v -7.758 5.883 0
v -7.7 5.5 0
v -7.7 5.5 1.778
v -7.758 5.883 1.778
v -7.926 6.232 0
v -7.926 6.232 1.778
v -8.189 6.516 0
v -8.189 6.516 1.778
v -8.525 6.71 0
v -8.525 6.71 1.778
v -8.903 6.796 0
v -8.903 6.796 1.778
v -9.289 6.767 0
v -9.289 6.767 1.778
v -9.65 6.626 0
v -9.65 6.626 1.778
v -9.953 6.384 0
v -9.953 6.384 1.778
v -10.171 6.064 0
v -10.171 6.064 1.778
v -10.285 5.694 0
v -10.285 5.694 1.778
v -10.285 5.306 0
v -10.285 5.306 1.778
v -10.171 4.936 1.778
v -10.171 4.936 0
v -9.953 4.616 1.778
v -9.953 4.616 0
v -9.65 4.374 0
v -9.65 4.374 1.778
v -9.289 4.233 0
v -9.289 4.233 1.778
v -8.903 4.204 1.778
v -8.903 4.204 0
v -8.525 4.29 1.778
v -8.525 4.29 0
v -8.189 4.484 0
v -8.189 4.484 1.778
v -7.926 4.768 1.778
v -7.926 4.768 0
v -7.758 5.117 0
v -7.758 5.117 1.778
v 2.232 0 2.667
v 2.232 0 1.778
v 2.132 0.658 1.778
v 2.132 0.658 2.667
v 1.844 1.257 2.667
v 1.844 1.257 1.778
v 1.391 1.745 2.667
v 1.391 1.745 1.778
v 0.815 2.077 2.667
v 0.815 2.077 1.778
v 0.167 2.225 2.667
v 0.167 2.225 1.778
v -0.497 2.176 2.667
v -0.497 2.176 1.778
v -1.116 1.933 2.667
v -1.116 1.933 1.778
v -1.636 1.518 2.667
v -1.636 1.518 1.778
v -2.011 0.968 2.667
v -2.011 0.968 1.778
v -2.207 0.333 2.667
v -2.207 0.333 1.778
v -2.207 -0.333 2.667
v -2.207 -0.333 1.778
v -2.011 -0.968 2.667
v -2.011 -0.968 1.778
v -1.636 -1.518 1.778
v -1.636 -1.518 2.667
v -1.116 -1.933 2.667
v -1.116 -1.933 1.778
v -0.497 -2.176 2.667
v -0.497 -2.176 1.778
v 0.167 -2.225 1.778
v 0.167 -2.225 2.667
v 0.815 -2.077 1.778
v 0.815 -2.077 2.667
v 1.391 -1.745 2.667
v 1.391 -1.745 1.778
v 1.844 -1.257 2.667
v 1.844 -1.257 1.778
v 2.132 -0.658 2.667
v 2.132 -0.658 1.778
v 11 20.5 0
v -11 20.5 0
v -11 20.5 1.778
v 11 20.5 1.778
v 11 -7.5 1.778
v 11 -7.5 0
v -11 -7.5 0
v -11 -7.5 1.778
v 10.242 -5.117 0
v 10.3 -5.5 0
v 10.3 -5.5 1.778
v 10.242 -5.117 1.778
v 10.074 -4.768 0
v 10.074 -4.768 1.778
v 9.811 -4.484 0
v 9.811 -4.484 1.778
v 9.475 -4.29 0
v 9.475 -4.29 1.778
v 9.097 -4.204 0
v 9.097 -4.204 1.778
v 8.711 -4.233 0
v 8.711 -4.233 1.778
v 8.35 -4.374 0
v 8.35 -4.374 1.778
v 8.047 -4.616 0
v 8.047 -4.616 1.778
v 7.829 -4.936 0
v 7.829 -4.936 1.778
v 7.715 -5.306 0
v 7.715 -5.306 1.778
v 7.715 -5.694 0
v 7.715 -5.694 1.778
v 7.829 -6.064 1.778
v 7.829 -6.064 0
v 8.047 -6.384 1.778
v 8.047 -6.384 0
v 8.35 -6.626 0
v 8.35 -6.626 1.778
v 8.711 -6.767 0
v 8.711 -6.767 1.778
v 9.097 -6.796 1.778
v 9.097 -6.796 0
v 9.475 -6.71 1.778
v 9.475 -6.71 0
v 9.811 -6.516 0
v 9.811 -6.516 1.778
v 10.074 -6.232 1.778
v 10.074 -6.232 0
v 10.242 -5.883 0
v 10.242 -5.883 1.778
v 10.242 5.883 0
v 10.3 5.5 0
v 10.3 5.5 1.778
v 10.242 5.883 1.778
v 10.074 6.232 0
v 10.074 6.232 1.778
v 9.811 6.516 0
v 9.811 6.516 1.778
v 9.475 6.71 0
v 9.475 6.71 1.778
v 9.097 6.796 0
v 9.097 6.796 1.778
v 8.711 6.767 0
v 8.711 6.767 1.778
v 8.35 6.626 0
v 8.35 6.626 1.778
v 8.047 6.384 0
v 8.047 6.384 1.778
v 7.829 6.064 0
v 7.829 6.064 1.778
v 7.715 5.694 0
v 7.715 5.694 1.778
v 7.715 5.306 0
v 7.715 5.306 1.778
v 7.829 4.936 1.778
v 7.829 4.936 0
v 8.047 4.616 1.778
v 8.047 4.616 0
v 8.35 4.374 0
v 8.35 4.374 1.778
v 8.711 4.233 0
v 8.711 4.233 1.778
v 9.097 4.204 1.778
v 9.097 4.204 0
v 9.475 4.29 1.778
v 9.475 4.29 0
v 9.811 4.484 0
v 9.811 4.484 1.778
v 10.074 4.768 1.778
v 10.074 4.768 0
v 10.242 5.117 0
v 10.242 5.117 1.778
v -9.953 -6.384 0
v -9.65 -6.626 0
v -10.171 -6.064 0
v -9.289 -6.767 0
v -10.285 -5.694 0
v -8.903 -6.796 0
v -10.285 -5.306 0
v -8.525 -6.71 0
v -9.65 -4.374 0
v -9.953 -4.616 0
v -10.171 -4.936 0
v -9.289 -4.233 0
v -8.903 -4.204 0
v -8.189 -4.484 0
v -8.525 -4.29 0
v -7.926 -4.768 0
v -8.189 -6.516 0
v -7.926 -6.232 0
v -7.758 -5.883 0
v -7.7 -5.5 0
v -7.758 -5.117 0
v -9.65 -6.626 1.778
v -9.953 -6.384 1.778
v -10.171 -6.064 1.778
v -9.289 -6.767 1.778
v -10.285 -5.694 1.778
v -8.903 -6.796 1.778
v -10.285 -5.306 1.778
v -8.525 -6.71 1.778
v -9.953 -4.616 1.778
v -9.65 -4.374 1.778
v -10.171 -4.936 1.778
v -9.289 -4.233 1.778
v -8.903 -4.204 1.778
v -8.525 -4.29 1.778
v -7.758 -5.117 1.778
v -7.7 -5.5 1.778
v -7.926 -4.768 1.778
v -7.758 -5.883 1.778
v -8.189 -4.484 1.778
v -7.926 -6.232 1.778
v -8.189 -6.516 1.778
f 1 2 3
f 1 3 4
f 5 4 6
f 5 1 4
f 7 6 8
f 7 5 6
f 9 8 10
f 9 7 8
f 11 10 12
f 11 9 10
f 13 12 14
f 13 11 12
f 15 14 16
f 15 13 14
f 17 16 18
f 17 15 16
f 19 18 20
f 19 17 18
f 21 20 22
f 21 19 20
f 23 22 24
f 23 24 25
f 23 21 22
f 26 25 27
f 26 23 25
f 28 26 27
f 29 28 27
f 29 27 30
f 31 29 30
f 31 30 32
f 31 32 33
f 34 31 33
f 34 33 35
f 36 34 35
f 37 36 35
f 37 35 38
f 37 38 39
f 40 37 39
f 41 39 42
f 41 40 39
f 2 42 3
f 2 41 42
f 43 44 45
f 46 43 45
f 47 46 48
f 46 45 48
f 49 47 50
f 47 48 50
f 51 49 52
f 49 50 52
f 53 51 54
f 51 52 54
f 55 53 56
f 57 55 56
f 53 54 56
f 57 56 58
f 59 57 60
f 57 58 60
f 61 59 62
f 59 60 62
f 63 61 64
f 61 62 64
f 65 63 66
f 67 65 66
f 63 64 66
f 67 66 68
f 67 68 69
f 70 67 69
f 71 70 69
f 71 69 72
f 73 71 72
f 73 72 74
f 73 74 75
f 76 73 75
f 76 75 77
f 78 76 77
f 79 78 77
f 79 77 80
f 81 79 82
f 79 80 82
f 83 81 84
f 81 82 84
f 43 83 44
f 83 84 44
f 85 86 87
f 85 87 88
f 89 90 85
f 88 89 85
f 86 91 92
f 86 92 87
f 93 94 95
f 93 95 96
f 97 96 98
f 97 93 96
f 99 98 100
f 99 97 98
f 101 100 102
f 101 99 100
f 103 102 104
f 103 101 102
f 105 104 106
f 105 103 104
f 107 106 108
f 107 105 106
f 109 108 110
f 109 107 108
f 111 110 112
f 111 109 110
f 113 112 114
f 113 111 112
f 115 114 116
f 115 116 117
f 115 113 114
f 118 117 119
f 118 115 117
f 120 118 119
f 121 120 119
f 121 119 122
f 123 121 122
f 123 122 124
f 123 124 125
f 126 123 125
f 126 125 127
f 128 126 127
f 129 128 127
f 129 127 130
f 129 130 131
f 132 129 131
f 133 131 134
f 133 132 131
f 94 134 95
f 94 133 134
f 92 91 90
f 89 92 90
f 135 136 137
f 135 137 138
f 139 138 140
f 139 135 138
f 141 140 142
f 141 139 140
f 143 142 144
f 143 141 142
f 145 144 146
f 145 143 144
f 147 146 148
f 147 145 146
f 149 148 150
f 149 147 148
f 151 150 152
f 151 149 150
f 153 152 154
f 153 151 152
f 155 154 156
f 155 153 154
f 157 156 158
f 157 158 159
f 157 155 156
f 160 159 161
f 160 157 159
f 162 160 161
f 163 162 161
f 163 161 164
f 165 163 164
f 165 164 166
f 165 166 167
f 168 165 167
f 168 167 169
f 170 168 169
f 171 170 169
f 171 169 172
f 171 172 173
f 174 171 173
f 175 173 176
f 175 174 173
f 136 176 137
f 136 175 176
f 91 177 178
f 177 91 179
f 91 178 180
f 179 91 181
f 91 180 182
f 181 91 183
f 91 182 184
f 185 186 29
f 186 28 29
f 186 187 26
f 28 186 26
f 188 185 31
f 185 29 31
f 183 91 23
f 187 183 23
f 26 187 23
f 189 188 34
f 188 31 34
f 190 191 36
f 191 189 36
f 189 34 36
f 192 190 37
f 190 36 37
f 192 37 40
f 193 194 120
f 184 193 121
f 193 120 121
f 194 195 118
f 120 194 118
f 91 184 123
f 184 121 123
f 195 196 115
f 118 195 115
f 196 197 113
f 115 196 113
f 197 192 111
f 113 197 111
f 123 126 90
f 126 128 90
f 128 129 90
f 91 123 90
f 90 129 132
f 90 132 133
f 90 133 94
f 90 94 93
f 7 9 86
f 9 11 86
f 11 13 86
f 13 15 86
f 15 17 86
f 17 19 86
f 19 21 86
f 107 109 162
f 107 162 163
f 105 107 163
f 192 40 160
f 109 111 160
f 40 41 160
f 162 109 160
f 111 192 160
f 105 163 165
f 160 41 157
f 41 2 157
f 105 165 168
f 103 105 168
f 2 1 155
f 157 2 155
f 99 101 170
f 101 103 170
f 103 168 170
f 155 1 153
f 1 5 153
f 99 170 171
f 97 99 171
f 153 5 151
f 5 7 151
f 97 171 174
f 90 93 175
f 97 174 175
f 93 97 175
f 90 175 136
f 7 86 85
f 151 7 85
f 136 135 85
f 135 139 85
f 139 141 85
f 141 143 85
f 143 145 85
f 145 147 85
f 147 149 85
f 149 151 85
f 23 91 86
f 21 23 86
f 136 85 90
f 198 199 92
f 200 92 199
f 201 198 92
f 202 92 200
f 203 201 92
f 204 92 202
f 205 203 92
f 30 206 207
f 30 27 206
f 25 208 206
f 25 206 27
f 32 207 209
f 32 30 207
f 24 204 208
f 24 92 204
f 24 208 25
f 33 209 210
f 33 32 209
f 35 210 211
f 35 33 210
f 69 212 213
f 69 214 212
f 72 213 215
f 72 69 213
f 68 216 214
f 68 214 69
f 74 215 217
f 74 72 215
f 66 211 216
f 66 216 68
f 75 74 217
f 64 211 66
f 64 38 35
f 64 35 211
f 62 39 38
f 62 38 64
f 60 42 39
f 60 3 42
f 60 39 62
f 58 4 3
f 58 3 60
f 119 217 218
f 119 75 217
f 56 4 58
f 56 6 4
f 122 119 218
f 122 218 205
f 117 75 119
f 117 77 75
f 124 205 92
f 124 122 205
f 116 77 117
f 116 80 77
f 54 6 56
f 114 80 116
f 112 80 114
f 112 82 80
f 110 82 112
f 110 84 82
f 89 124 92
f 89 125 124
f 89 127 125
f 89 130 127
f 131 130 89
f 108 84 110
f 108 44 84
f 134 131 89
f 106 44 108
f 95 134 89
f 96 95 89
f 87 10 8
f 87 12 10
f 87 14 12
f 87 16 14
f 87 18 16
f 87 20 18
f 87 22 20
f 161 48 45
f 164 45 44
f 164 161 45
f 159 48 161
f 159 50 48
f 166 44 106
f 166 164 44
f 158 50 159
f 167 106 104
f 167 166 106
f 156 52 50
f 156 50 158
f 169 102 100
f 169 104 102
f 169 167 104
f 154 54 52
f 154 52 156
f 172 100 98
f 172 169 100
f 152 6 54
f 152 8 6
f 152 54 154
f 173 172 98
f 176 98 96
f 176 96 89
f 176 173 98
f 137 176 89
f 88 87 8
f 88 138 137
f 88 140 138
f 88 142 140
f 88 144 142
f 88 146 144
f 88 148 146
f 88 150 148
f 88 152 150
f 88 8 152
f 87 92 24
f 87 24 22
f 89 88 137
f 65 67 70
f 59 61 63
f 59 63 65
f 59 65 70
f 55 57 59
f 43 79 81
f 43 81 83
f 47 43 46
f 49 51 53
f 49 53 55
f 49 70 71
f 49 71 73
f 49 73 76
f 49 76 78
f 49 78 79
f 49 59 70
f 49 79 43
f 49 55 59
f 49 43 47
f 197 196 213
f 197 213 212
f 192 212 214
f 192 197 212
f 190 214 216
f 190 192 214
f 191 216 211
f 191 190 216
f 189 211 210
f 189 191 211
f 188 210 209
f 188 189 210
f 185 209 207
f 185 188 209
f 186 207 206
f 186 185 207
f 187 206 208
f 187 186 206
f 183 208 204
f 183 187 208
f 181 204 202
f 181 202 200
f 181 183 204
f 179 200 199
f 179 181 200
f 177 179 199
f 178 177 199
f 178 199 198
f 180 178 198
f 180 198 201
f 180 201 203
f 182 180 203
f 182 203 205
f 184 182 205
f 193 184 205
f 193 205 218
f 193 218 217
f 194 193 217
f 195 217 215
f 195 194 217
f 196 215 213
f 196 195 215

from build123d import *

# Parameters (mm, degrees)
F0_W     = 22
F0_H     = 28
F0_R     = 1.3
F1_DEPTH = 1.778
F2_R     = 2.231507
F3_DEPTH = 0.889


with BuildPart() as f1:
    # F0 (on Top) → F1 (new body)
    with BuildSketch(Plane.XY):
        with Locations((0, 6.5)):
            Rectangle(F0_W, F0_H)
        with Locations((-9, -5.5)):
            Circle(F0_R, mode=Mode.SUBTRACT)
        with Locations((-9, 5.5)):
            Circle(F0_R, mode=Mode.SUBTRACT)
        with Locations((9, -5.5)):
            Circle(F0_R, mode=Mode.SUBTRACT)
        with Locations((9, 5.5)):
            Circle(F0_R, mode=Mode.SUBTRACT)
    extrude(amount=F1_DEPTH)

    # F2 (on face) → F3 (join)
    with BuildSketch(Plane.XY.offset(1.778)):
        Circle(F2_R)
    extrude(amount=F3_DEPTH)


solid = f1.part
